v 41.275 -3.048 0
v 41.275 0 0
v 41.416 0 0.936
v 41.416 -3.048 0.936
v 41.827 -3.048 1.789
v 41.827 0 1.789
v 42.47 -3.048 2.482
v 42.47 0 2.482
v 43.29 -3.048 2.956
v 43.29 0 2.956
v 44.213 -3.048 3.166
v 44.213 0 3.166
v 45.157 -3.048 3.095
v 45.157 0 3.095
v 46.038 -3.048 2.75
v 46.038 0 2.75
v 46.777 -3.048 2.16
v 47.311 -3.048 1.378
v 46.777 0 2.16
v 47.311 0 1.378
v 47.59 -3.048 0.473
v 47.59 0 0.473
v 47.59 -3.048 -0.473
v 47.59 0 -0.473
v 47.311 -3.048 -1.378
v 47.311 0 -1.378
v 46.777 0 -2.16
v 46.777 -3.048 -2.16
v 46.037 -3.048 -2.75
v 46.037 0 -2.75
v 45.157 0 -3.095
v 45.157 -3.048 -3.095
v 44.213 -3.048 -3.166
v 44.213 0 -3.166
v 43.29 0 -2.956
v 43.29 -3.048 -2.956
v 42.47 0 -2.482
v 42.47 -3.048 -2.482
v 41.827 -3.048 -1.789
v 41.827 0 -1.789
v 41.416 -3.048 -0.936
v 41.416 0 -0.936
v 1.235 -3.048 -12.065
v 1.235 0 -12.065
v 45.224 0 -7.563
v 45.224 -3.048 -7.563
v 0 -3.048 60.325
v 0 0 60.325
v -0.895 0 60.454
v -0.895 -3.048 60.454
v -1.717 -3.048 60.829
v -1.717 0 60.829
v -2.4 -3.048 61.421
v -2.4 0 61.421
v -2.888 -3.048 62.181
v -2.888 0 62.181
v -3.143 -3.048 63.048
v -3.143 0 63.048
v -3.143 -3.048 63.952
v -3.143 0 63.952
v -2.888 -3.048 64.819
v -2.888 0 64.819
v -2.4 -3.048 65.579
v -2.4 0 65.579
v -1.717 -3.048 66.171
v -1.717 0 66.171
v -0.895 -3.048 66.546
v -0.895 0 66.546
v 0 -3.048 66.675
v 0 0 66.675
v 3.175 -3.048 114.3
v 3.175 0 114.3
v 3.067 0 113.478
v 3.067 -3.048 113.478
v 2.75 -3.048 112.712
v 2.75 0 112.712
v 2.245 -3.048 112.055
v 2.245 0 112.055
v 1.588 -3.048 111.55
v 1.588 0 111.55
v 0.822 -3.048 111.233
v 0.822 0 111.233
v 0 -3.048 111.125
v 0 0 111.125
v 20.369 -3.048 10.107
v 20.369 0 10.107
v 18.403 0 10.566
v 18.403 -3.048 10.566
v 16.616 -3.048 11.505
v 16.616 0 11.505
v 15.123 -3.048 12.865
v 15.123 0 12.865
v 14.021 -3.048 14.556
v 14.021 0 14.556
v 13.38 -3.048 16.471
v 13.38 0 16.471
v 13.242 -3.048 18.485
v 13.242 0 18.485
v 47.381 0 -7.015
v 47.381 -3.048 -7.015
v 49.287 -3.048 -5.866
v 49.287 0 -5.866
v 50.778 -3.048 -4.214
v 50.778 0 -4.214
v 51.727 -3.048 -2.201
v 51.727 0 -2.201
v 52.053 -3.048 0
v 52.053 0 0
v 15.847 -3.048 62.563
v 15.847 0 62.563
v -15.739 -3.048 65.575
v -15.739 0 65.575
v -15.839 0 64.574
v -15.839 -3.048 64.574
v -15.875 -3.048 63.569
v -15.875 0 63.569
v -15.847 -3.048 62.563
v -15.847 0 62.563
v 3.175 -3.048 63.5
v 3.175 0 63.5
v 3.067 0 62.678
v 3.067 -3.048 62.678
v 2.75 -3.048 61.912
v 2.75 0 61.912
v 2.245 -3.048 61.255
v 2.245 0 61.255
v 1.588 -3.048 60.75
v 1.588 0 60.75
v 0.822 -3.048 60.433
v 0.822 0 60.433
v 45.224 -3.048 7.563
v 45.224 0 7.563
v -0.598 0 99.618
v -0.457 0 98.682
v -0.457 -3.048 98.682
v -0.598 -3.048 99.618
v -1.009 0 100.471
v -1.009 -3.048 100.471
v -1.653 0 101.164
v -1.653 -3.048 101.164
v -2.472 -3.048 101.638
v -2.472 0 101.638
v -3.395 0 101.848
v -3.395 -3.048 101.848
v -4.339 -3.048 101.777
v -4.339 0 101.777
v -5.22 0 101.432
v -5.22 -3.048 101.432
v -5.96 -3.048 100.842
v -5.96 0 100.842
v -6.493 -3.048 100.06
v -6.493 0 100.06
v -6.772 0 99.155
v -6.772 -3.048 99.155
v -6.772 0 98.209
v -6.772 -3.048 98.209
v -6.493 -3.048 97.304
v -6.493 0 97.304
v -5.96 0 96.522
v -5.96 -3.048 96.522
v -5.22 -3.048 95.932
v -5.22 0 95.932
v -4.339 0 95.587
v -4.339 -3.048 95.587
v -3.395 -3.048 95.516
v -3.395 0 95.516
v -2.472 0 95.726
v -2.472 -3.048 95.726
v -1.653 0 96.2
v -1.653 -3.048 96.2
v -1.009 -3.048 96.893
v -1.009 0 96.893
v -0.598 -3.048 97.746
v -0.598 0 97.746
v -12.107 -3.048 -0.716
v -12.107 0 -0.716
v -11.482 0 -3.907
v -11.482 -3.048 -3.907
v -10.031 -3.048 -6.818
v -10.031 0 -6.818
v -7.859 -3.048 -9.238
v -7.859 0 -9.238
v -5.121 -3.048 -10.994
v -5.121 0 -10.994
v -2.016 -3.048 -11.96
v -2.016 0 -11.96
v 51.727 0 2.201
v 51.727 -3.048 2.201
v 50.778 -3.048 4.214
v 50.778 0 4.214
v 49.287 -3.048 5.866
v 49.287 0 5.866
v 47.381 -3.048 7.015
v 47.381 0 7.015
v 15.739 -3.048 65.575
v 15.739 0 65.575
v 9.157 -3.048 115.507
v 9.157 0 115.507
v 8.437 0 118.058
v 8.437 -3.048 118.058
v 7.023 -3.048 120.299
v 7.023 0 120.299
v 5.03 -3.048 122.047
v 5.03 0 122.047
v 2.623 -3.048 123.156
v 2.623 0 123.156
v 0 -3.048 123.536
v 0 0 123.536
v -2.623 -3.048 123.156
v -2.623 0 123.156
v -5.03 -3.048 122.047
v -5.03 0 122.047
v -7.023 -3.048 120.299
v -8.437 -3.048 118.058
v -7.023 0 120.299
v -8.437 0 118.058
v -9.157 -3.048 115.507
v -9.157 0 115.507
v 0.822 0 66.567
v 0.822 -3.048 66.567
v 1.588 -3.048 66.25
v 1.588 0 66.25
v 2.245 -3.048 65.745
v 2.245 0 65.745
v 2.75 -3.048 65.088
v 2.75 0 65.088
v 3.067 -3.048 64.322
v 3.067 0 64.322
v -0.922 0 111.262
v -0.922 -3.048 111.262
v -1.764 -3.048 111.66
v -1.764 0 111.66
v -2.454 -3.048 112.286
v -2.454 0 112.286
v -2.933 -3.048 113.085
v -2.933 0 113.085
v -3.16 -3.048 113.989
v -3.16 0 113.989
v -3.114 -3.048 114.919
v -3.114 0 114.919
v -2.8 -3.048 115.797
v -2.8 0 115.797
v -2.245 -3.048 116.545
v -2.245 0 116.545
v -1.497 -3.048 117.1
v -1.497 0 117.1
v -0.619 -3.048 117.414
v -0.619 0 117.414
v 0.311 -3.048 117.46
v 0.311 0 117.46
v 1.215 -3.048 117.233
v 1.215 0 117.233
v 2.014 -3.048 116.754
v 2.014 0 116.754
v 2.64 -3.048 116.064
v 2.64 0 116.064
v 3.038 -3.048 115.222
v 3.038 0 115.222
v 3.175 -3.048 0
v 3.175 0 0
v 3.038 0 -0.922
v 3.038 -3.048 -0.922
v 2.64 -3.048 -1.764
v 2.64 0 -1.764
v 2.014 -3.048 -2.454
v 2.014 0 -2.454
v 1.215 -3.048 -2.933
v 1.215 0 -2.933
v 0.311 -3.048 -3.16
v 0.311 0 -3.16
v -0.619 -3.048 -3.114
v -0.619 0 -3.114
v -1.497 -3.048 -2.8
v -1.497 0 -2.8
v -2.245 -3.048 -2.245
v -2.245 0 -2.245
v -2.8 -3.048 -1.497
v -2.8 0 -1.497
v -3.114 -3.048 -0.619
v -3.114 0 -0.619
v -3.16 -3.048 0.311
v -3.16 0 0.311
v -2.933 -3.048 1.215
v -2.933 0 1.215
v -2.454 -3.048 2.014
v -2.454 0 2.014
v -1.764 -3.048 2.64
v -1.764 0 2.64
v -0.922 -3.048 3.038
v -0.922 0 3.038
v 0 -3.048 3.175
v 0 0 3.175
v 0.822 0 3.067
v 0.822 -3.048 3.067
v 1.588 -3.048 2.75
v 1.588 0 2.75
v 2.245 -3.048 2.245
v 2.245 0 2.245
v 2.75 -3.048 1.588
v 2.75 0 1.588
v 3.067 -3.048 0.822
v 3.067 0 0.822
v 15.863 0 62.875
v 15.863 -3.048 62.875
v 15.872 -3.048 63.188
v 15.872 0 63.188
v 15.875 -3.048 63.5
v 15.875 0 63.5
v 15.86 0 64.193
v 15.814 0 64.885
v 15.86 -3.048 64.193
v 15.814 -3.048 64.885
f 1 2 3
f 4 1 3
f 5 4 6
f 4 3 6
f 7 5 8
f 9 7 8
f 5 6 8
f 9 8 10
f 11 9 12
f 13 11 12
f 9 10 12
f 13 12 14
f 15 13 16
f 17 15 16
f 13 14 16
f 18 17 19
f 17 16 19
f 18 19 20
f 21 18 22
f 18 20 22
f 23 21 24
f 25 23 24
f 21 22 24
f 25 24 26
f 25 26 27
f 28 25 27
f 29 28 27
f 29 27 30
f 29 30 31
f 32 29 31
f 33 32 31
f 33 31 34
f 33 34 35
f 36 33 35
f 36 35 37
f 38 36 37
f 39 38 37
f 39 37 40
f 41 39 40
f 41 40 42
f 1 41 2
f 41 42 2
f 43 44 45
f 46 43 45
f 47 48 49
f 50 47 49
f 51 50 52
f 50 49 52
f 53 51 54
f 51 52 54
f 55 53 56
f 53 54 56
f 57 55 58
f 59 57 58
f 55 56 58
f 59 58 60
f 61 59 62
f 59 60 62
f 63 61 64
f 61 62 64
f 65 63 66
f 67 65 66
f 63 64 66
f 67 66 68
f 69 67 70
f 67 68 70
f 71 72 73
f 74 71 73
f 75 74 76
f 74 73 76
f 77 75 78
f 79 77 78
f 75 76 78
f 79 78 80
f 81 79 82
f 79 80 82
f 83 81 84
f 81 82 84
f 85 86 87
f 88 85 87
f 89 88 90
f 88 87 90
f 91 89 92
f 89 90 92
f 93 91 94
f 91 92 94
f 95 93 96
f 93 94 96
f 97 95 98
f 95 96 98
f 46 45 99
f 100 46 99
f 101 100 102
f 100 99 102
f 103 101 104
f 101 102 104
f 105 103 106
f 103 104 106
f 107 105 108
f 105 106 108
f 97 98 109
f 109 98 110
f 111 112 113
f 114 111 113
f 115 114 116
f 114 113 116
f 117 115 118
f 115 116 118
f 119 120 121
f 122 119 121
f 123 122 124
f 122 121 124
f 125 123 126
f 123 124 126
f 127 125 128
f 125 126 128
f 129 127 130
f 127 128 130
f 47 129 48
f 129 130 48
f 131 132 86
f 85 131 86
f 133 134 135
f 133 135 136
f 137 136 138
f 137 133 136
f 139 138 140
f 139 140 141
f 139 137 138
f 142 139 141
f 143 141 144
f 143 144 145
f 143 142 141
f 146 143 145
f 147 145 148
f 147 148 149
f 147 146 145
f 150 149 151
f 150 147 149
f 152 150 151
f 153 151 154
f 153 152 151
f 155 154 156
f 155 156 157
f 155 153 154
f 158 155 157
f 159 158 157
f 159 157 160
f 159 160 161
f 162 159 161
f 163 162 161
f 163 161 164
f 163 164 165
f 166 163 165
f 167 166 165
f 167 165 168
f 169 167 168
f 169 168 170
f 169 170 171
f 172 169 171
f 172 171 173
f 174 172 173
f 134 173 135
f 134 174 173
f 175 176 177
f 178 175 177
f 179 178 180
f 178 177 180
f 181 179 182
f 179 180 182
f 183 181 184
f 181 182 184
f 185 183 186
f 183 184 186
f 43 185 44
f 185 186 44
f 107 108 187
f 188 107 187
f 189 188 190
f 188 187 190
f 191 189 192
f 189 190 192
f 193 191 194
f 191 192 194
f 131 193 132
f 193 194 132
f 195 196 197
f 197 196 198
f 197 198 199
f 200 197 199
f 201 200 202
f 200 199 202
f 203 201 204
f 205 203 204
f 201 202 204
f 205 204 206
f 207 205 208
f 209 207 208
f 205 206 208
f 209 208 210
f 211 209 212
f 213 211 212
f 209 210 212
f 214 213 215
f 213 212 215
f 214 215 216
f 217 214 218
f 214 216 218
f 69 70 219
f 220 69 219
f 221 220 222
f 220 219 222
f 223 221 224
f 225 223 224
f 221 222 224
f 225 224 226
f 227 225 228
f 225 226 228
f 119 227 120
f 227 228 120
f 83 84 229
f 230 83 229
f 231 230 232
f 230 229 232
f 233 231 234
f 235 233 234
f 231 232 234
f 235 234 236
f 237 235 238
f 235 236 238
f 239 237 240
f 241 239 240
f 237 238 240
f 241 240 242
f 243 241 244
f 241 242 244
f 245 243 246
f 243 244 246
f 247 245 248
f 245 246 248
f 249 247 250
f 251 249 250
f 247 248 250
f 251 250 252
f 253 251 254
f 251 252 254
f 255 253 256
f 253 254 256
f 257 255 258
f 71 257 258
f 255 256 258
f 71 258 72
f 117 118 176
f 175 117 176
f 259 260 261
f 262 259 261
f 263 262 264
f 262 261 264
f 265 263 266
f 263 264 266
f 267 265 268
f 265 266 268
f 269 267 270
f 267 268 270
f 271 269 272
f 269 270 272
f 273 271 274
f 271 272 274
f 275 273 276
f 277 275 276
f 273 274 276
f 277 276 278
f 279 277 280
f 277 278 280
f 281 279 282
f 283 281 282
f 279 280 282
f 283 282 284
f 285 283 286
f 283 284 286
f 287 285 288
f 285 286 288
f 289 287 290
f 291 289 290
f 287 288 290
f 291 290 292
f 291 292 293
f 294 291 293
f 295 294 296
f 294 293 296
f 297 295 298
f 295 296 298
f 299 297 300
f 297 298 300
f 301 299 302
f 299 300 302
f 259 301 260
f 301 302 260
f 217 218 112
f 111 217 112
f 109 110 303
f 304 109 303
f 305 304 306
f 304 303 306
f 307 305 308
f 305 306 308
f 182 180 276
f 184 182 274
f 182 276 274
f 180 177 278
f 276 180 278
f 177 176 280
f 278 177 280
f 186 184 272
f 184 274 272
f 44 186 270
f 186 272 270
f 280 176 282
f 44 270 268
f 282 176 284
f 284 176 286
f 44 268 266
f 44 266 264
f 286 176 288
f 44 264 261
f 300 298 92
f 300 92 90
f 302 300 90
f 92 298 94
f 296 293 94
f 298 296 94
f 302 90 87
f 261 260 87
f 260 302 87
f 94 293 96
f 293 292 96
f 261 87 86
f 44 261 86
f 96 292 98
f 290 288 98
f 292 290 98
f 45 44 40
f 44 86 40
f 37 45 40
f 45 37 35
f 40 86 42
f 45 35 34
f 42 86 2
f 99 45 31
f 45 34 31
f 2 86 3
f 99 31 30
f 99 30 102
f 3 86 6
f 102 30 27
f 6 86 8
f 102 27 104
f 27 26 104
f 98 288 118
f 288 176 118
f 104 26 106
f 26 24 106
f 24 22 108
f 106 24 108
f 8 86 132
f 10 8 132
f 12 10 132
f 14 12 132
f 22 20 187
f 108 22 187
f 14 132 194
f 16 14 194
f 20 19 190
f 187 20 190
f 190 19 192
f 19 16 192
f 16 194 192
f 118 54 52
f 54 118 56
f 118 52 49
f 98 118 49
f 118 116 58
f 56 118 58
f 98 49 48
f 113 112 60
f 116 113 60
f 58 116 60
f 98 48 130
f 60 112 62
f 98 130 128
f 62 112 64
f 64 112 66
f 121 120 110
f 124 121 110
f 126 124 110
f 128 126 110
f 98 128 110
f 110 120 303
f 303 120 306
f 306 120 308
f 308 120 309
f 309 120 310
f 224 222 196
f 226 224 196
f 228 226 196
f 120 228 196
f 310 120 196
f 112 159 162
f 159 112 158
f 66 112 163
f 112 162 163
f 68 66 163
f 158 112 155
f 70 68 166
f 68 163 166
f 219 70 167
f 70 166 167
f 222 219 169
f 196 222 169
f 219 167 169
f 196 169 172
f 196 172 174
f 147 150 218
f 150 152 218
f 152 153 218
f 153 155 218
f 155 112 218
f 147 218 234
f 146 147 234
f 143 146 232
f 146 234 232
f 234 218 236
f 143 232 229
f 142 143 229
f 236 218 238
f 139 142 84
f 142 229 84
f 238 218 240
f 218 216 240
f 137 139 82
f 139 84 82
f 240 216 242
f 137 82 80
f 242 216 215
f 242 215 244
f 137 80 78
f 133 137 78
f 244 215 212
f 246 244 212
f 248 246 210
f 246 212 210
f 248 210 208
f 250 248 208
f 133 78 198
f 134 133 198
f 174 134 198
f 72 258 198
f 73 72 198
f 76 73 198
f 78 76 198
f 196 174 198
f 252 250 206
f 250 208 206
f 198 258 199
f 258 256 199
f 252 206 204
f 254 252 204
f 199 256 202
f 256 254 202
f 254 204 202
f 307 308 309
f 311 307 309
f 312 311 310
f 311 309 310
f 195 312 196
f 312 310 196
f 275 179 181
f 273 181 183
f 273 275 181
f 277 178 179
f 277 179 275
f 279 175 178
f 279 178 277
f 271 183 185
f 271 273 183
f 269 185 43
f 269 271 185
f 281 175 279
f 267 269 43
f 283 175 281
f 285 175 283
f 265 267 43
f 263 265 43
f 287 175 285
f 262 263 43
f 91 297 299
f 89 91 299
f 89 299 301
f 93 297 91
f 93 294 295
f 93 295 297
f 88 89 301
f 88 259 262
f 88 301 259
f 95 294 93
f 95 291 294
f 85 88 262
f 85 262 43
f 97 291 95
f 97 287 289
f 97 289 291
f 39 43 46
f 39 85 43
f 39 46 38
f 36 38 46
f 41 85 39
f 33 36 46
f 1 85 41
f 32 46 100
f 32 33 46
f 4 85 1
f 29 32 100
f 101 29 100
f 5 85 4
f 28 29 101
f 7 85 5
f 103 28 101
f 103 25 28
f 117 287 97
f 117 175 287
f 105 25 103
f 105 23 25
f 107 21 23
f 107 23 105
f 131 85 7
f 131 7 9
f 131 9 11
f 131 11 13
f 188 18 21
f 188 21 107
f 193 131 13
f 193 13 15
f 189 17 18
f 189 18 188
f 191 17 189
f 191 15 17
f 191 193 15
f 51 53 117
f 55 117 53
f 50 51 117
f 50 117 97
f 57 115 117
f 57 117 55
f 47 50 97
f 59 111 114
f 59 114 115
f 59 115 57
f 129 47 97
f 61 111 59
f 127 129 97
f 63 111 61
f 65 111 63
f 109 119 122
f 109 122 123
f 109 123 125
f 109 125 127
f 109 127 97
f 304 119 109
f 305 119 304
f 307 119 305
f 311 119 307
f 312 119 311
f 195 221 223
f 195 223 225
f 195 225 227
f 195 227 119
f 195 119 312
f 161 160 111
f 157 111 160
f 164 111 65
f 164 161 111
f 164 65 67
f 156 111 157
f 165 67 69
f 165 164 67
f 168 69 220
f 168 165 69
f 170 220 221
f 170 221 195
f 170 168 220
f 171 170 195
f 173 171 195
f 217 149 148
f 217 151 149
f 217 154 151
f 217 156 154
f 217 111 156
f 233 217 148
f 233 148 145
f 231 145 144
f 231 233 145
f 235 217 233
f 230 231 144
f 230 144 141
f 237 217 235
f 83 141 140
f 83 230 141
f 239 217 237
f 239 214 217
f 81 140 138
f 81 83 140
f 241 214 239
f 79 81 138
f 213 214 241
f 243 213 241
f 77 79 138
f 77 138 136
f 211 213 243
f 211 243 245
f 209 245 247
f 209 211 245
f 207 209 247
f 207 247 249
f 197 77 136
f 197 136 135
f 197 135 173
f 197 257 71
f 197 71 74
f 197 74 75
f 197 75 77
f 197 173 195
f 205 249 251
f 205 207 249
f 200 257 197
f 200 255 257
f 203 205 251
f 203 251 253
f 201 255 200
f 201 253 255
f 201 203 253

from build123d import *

# Parameters (mm, degrees)
F0_R     = 3.175
F1_DEPTH = 3.048


with BuildPart() as f1:
    # F0 (on Front) → F1 (new body)
    with BuildSketch(Plane.XZ):
        with BuildLine():
            Line((12.1285329959, 0), (3.175, 0))
            ThreePointArc((3.175, 0), (-2.2450640303, -2.2450640303), (0, 3.175))
            Line((0, 3.175), (0, 12.1285329959))
            ThreePointArc((0, 12.1285329959), (-8.8255371973, 8.3193272451), (-12.1074052539, -0.7155771445))
            ThreePointArc((-12.1074052539, -0.7155771445), (-7.858618829, -9.2381503956), (1.2349249899, -12.0654992811))
            ThreePointArc((1.2349249899, -12.0654992811), (9.002198096, -8.1278374782), (12.1285329959, 0))
        make_face()
        with BuildLine():
            ThreePointArc((0, 12.1285329959), (8.5761679272, 8.5761679272), (12.1285329959, 0))
            Line((12.1285329959, 0), (36.8473577956, 0))
            ThreePointArc((36.8473577956, 0), (39.3551513268, 5.6429323481), (45.2240996253, 7.5631301892))
            Line((45.2240996253, 7.5631301892), (20.3690705941, 10.1070859559))
            ThreePointArc((20.3690705941, 10.1070859559), (15.1229915635, 12.8646775774), (13.2422076318, 18.4850253022))
            Line((13.2422076318, 18.4850253022), (15.8473459627, 62.563383249))
            ThreePointArc((15.8473459627, 62.563383249), (10.8891421627, 51.9482811685), (0, 47.625))
            Line((0, 47.625), (0, 12.1285329959))
        make_face()
        with BuildLine():
            Line((36.8473577956, 0), (12.1285329959, 0))
            ThreePointArc((12.1285329959, 0), (9.002198096, -8.1278374782), (1.2349249899, -12.0654992811))
            Line((1.2349249899, -12.0654992811), (45.2240996253, -7.5631301892))
            ThreePointArc((45.2240996253, -7.5631301892), (39.3551513268, -5.6429323481), (36.8473577956, 0))
        make_face()
        with BuildLine():
            ThreePointArc((-12.1074052539, -0.7155771445), (-8.8255371973, 8.3193272451), (0, 12.1285329959))
            Line((0, 12.1285329959), (0, 47.625))
            ThreePointArc((0, 47.625), (-10.8891421627, 51.9482811685), (-15.8473459627, 62.563383249))
            Line((-15.8473459627, 62.563383249), (-12.1074052539, -0.7155771445))
        make_face()
        with BuildLine():
            ThreePointArc((45.2240996253, 7.5631301892), (39.3551513268, 5.6429323481), (36.8473577956, 0))
            ThreePointArc((36.8473577956, 0), (39.3551513268, -5.6429323481), (45.2240996253, -7.5631301892))
            ThreePointArc((45.2240996253, -7.5631301892), (50.0929323481, -5.0948486732), (52.0526422044, 0))
            ThreePointArc((52.0526422044, 0), (50.0929323481, 5.0948486732), (45.2240996253, 7.5631301892))
        make_face()
        with BuildLine():
            ThreePointArc((47.625, 0), (44.45, -3.175), (41.275, 0))
            ThreePointArc((41.275, 0), (44.45, 3.175), (47.625, 0))
        make_face(mode=Mode.SUBTRACT)
        with BuildLine():
            ThreePointArc((-15.8473459627, 62.563383249), (-10.8891421627, 51.9482811685), (0, 47.625))
            Line((0, 47.625), (0, 60.325))
            ThreePointArc((0, 60.325), (-3.175, 63.5), (0, 66.675))
            Line((0, 66.675), (0, 79.375))
            ThreePointArc((0, 79.375), (-10.4661659349, 75.4362890222), (-15.7388575186, 65.5746057477))
            ThreePointArc((-15.7388575186, 65.5746057477), (-15.8647069883, 64.071574295), (-15.8473459627, 62.563383249))
        make_face()
        with BuildLine():
            Line((0, 60.325), (0, 47.625))
            ThreePointArc((0, 47.625), (10.8891421627, 51.9482811685), (15.8473459627, 62.563383249))
            ThreePointArc((15.8473459627, 62.563383249), (15.8680849846, 63.0314875444), (15.875, 63.5))
            ThreePointArc((15.875, 63.5), (15.8409278154, 64.5395340042), (15.7388575186, 65.5746057477))
            ThreePointArc((15.7388575186, 65.5746057477), (10.4661659349, 75.4362890222), (0, 79.375))
            Line((0, 79.375), (0, 66.675))
            ThreePointArc((0, 66.675), (2.2450640303, 65.7450640303), (3.175, 63.5))
            ThreePointArc((3.175, 63.5), (2.2450640303, 61.2549359697), (0, 60.325))
        make_face()
        with BuildLine():
            Line((-9.1570523114, 115.5070300106), (-15.7388575186, 65.5746057477))
            ThreePointArc((-15.7388575186, 65.5746057477), (-10.4661659349, 75.4362890222), (0, 79.375))
            Line((0, 79.375), (0, 105.0637383927))
            ThreePointArc((0, 105.0637383927), (-6.9446732617, 108.2106616314), (-9.1570523114, 115.5070300106))
        make_face()
        with Locations((-3.6322516389, 98.6820235848)):
            Circle(F0_R, mode=Mode.SUBTRACT)
        with BuildLine():
            Line((0, 105.0637383927), (0, 79.375))
            ThreePointArc((0, 79.375), (10.4661659349, 75.4362890222), (15.7388575186, 65.5746057477))
            Line((15.7388575186, 65.5746057477), (9.1570523114, 115.5070300106))
            ThreePointArc((9.1570523114, 115.5070300106), (9.2164380099, 114.9048131032), (9.2362616073, 114.3))
            ThreePointArc((9.2362616073, 114.3), (6.5310232154, 107.7689767846), (0, 105.0637383927))
        make_face()
        with BuildLine():
            ThreePointArc((9.1570523114, 115.5070300106), (0, 123.5362616073), (-9.1570523114, 115.5070300106))
            ThreePointArc((-9.1570523114, 115.5070300106), (-6.9446732617, 108.2106616314), (0, 105.0637383927))
            ThreePointArc((0, 105.0637383927), (6.5310232154, 107.7689767846), (9.2362616073, 114.3))
            ThreePointArc((9.2362616073, 114.3), (9.2164380099, 114.9048131032), (9.1570523114, 115.5070300106))
        make_face()
        with BuildLine():
            ThreePointArc((3.175, 114.3), (2.2450640303, 112.0549359697), (0, 111.125))
            ThreePointArc((0, 111.125), (-2.2450640303, 116.5450640303), (3.175, 114.3))
        make_face(mode=Mode.SUBTRACT)
        with BuildLine():
            ThreePointArc((0, 3.175), (2.2450640303, 2.2450640303), (3.175, 0))
            Line((3.175, 0), (12.1285329959, 0))
            ThreePointArc((12.1285329959, 0), (8.5761679272, 8.5761679272), (0, 12.1285329959))
            Line((0, 12.1285329959), (0, 3.175))
        make_face()
    extrude(amount=F1_DEPTH)


solid = f1.part
